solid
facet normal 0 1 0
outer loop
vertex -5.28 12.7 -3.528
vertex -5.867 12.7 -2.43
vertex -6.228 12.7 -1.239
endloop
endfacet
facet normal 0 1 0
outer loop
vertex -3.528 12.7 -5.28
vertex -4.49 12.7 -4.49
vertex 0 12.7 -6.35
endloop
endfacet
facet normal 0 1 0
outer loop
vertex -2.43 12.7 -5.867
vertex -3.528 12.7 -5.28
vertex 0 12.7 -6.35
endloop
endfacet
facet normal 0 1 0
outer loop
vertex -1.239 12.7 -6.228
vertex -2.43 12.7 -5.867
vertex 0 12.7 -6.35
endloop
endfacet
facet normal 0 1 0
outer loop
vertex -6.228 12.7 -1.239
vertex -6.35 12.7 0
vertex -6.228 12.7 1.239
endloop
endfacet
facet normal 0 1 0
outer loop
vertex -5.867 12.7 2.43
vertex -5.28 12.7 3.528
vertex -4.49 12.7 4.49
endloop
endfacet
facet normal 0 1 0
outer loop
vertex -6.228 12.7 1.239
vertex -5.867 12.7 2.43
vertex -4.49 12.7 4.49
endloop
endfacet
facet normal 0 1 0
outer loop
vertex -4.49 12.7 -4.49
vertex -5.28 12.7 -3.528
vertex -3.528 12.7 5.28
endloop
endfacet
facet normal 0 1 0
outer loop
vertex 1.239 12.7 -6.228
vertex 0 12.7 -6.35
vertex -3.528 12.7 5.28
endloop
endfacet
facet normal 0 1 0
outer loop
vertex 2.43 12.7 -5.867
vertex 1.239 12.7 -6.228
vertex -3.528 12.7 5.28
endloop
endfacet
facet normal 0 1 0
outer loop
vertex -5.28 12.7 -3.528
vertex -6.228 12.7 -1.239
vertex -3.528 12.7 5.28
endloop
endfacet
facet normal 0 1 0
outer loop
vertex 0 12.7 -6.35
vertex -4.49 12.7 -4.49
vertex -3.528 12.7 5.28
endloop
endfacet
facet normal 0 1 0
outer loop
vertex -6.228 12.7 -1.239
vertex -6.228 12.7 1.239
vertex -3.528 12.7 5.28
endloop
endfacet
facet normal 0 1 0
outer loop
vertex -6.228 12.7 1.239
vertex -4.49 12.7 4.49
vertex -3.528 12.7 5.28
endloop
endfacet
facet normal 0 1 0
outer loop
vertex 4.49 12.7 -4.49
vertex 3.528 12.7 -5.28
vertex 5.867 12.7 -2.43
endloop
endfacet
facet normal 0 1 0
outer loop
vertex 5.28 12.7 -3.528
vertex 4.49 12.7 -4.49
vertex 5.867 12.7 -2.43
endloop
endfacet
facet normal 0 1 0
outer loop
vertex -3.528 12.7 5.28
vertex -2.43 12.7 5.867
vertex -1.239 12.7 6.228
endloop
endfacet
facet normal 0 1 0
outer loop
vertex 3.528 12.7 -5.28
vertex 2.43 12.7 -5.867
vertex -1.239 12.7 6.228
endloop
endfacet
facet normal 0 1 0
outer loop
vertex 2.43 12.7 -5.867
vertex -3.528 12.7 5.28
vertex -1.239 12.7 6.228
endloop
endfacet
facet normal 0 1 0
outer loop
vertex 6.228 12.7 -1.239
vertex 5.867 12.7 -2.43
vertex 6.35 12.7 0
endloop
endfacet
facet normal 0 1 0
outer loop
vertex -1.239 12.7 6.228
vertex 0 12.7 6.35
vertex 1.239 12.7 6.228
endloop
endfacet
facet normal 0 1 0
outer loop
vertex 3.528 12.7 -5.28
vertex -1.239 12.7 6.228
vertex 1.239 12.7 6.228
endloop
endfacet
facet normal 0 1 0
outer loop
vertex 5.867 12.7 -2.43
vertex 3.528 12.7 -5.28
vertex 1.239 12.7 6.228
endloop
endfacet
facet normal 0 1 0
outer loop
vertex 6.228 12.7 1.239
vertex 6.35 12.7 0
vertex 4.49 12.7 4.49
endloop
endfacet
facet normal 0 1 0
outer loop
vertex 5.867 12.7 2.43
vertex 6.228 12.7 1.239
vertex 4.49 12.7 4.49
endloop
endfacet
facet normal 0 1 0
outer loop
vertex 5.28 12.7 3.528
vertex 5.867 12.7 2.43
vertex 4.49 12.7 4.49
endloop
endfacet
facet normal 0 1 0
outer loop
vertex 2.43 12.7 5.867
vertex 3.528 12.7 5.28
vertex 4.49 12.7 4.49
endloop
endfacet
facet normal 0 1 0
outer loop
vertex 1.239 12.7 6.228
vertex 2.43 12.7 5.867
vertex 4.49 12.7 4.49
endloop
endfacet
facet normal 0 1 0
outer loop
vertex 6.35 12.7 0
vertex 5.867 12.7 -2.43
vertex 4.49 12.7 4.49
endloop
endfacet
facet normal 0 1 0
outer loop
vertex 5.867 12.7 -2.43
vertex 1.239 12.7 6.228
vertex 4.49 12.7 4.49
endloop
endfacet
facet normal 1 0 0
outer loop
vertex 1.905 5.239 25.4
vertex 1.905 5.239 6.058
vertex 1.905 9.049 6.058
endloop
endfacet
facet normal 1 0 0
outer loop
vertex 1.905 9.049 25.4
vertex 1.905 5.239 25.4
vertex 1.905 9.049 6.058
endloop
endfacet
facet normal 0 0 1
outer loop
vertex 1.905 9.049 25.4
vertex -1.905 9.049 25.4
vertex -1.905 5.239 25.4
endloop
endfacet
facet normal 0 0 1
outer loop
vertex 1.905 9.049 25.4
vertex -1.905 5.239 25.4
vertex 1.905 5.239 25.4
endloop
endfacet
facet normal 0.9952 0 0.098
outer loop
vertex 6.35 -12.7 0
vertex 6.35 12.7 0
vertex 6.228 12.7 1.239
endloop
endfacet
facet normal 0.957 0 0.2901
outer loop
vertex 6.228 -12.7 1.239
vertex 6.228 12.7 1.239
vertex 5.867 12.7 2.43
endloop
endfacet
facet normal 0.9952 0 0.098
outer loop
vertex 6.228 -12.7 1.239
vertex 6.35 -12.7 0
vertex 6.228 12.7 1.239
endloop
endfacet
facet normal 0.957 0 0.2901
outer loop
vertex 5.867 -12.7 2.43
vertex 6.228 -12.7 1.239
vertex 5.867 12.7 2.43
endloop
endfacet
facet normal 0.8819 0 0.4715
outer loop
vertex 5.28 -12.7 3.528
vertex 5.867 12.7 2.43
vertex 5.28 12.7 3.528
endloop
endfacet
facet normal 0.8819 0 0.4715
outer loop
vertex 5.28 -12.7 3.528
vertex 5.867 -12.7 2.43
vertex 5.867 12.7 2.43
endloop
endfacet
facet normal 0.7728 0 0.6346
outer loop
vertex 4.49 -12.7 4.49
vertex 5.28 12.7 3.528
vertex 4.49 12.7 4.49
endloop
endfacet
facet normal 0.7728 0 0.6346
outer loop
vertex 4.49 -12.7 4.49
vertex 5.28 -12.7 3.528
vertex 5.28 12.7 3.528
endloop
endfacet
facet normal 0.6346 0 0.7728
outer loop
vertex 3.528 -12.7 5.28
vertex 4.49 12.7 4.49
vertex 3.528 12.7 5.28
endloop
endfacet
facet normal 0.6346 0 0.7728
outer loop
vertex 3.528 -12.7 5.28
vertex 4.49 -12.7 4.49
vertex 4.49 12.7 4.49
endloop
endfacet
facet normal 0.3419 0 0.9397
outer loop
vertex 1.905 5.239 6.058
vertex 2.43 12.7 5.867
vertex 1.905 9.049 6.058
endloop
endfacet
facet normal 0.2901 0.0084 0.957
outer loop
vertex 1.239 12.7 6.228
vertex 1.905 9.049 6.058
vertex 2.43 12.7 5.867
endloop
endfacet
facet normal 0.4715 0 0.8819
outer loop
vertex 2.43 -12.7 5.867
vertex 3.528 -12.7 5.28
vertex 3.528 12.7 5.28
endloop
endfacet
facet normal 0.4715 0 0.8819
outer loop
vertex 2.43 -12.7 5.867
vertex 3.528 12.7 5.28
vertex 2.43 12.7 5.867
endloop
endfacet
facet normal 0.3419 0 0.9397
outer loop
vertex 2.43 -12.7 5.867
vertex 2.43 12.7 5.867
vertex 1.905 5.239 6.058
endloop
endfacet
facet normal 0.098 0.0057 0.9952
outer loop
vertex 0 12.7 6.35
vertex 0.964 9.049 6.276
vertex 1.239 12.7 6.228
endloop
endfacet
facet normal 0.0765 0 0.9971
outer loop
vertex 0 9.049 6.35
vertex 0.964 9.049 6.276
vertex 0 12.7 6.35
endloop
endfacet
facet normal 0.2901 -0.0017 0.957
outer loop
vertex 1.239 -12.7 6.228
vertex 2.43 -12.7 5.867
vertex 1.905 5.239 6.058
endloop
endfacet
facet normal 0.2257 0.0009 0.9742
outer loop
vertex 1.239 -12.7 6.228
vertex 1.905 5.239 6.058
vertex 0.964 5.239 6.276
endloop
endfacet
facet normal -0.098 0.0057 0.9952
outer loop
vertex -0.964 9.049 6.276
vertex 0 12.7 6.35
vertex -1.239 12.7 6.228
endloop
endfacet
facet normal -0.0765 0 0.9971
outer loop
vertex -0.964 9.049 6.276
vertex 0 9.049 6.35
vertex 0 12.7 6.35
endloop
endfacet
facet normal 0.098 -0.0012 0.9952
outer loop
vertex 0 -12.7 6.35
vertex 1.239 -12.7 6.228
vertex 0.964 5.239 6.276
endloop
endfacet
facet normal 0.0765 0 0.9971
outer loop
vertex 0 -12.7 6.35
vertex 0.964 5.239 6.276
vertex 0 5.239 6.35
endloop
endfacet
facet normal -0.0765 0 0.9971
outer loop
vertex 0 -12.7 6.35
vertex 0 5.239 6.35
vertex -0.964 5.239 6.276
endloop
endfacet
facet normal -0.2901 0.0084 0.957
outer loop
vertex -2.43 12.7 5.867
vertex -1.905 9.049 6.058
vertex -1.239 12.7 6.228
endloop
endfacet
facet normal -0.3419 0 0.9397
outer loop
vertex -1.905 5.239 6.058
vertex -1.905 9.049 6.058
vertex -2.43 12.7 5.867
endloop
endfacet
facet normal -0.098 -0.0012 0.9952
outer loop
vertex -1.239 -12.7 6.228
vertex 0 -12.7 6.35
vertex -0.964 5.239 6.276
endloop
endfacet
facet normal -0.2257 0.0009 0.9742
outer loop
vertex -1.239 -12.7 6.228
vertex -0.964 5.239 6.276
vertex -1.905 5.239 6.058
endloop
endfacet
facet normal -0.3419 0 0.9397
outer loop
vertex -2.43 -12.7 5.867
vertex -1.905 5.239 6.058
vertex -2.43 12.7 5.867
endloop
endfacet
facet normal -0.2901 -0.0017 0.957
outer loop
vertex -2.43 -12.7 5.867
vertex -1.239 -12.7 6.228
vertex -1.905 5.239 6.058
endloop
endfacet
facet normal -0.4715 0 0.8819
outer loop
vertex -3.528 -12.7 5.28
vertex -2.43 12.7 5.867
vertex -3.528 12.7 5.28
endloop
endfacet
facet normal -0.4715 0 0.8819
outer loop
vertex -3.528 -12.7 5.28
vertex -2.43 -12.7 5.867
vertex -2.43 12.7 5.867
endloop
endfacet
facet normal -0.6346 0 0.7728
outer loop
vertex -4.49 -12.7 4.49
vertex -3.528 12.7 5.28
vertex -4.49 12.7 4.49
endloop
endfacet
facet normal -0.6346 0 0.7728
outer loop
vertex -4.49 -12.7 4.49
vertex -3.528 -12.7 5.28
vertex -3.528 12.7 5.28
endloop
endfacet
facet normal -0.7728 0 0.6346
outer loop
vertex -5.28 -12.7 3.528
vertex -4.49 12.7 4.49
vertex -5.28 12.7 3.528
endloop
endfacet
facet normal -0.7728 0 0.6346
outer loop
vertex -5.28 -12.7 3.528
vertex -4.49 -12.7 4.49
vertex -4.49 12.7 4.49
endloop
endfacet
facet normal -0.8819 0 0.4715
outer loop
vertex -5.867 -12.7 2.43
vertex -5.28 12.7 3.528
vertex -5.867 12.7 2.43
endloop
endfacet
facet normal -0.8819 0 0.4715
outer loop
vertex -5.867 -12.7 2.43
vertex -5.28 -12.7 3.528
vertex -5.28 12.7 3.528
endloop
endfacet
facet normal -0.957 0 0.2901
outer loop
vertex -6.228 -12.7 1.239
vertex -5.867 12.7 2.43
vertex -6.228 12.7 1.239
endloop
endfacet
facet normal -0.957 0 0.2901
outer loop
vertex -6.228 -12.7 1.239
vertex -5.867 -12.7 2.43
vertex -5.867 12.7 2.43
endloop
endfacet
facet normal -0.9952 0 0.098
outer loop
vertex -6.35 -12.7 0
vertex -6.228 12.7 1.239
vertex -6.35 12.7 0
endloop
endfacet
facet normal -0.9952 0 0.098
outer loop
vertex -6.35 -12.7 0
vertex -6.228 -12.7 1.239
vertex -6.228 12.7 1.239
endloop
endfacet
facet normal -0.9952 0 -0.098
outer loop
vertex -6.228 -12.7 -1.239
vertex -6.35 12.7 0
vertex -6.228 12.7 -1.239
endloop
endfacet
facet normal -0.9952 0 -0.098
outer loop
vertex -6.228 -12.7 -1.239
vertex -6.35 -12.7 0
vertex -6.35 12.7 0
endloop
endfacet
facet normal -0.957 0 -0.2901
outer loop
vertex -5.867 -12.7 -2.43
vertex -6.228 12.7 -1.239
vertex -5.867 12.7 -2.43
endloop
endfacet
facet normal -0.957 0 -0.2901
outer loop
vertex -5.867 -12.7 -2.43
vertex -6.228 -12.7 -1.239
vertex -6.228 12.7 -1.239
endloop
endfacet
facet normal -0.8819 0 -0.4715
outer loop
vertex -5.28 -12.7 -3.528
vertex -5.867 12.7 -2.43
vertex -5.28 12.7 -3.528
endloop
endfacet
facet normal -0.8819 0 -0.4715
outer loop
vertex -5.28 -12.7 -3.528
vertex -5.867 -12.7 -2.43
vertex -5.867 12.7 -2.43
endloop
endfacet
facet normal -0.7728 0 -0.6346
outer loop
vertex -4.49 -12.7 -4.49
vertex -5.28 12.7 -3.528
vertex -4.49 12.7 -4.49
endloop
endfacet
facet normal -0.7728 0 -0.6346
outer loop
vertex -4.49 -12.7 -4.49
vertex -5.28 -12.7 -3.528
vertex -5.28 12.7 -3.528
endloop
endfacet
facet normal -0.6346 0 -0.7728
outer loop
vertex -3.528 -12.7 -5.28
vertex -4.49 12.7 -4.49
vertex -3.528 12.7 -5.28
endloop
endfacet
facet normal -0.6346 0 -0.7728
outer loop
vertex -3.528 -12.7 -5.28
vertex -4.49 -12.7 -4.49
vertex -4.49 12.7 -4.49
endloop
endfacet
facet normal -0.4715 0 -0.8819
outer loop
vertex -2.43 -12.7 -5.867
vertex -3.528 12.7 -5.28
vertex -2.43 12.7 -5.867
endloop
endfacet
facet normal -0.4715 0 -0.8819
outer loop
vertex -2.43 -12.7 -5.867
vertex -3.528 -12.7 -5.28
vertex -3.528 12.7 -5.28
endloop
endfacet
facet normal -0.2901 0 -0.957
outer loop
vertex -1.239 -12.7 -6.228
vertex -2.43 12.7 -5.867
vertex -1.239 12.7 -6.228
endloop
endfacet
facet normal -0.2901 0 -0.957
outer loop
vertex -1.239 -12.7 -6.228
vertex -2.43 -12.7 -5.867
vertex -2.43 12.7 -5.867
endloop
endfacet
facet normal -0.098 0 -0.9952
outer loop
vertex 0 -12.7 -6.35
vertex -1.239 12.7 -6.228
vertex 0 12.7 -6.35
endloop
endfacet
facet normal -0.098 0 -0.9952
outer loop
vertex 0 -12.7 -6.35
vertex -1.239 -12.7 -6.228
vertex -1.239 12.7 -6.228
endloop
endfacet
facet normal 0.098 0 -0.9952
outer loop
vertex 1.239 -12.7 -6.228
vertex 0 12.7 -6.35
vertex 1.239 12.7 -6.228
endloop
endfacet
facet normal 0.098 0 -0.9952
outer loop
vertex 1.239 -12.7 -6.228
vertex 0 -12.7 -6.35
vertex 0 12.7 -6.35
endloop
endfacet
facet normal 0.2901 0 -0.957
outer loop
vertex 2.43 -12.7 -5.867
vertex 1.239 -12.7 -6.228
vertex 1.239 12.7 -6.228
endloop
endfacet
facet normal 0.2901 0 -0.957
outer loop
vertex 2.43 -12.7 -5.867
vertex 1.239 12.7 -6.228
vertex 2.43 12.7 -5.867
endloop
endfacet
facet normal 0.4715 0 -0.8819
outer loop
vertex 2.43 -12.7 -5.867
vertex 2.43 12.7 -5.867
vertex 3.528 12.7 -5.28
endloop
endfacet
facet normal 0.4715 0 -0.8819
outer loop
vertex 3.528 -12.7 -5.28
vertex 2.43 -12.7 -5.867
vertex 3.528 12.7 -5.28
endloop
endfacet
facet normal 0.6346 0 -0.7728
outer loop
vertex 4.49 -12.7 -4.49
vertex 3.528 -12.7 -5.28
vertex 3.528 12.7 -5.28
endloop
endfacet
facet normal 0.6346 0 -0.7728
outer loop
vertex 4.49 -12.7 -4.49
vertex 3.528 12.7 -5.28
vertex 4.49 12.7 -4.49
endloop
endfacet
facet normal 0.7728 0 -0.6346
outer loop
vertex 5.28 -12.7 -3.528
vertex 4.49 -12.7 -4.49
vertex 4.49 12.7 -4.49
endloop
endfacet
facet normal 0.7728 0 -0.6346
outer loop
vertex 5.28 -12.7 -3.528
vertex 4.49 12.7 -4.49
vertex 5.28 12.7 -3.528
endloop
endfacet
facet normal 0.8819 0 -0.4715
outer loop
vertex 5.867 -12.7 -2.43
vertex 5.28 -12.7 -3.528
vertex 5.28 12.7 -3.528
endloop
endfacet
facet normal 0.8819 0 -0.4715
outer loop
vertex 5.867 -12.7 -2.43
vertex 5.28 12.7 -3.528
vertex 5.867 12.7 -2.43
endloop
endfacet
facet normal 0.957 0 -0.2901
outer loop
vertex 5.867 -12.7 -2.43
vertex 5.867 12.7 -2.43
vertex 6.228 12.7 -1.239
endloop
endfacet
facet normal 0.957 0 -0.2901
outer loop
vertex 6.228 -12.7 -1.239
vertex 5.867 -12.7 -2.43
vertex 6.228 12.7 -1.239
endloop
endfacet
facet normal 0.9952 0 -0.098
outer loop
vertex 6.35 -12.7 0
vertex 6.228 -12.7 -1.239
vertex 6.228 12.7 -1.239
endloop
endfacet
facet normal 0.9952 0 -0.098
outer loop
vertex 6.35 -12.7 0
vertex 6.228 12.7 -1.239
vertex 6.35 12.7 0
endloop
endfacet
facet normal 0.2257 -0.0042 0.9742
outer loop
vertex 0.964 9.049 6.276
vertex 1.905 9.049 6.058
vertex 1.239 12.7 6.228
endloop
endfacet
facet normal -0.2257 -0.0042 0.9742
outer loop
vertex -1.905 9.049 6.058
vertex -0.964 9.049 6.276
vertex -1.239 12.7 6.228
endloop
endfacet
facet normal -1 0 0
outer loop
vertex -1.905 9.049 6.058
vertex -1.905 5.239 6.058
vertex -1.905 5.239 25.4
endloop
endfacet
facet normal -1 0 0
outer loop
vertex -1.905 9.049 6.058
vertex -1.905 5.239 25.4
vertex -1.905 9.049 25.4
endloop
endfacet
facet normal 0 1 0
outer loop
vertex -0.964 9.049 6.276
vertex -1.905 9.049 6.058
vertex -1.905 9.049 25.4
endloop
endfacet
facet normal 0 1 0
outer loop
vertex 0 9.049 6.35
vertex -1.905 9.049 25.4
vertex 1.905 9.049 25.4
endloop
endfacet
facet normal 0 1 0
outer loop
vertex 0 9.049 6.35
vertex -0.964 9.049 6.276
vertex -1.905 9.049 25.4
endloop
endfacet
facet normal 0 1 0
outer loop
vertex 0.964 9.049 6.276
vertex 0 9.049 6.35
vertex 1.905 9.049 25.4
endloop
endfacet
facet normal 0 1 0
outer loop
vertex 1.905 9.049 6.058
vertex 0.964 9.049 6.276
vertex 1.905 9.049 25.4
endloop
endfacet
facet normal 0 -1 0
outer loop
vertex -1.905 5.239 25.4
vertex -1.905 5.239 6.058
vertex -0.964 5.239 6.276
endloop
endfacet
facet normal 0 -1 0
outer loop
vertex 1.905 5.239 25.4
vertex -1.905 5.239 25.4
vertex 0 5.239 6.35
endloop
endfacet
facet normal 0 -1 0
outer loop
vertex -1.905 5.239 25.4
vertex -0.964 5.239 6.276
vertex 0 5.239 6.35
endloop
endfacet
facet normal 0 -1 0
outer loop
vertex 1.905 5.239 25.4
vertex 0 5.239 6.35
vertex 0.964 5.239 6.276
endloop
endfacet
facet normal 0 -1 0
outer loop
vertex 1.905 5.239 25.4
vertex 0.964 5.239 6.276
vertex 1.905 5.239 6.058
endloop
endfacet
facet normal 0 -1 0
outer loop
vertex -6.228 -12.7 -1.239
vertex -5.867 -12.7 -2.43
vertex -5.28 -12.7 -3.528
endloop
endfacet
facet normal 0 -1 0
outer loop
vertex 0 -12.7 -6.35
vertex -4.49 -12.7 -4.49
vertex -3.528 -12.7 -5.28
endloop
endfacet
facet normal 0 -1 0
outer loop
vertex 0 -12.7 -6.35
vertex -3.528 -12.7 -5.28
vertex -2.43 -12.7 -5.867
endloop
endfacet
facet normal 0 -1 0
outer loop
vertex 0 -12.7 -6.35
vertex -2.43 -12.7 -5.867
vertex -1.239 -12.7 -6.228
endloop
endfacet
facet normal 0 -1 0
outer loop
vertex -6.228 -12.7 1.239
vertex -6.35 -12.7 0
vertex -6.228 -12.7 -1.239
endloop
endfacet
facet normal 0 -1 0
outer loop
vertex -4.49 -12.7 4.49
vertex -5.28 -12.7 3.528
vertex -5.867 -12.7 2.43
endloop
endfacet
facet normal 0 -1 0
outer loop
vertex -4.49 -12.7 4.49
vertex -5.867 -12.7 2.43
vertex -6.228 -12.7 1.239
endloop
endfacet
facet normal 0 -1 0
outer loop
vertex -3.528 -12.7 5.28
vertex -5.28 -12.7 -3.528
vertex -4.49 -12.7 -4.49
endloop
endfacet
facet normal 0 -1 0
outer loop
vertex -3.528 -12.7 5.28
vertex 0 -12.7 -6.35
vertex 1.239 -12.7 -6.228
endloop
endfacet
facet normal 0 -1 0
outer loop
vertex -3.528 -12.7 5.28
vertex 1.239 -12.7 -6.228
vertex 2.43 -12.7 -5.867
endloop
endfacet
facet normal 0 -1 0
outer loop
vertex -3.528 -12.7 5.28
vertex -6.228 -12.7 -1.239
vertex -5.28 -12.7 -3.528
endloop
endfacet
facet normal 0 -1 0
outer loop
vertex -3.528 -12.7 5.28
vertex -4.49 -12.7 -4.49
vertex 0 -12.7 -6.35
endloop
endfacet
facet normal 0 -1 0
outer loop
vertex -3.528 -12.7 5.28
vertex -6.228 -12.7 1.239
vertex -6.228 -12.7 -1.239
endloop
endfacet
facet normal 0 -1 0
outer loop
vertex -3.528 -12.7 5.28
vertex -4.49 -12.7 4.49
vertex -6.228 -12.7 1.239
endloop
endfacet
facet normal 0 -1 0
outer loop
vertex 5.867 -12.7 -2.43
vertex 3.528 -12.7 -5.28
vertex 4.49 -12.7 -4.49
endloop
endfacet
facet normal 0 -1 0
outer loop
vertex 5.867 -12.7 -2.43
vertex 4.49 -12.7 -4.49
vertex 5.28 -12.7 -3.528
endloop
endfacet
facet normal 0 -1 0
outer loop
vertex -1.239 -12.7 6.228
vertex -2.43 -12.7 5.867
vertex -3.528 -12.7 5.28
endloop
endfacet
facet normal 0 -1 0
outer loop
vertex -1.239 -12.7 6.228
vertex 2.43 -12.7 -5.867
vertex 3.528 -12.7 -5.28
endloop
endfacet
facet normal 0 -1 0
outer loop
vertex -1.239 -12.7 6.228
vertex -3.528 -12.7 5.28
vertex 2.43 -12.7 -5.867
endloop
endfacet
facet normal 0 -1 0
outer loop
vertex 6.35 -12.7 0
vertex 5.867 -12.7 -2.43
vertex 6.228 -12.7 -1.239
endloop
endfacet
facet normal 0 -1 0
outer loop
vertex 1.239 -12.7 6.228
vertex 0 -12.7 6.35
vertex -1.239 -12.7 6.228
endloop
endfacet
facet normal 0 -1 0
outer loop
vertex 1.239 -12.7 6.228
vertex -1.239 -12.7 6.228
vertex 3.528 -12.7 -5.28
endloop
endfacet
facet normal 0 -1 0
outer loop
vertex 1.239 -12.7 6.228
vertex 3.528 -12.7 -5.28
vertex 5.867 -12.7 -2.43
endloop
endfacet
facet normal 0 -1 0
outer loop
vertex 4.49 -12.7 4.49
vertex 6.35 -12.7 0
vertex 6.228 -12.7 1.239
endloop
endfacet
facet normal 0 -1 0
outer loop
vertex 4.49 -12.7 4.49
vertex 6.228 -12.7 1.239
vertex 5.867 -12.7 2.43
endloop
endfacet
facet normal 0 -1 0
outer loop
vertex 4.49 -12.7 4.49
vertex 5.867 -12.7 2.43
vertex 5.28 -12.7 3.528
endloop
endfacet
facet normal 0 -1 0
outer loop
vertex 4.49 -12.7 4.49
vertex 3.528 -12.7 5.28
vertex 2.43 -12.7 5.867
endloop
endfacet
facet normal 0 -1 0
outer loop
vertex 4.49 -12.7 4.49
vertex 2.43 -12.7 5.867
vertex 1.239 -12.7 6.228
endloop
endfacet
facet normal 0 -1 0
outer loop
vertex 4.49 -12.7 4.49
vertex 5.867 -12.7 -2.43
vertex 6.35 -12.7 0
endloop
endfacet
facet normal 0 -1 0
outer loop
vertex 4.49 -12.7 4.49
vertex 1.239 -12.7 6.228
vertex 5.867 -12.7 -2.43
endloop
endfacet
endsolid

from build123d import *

# Parameters (mm, degrees)
F0_R     = 6.35
F1_DEPTH = 12.7
F2_W     = 3.81
F2_H     = 3.81
F3_DEPTH = 25.4


with BuildPart() as f1:
    # F0 (on Front) → F1 (new body, symmetric)
    with BuildSketch(Plane.XZ):
        Circle(F0_R)
    extrude(amount=F1_DEPTH, both=True)

    # F2 (on Top) → F3 (join)
    with BuildSketch(Plane.XY):
        with Locations((0, 7.143756)):
            Rectangle(F2_W, F2_H)
    extrude(amount=F3_DEPTH)


solid = f1.part
